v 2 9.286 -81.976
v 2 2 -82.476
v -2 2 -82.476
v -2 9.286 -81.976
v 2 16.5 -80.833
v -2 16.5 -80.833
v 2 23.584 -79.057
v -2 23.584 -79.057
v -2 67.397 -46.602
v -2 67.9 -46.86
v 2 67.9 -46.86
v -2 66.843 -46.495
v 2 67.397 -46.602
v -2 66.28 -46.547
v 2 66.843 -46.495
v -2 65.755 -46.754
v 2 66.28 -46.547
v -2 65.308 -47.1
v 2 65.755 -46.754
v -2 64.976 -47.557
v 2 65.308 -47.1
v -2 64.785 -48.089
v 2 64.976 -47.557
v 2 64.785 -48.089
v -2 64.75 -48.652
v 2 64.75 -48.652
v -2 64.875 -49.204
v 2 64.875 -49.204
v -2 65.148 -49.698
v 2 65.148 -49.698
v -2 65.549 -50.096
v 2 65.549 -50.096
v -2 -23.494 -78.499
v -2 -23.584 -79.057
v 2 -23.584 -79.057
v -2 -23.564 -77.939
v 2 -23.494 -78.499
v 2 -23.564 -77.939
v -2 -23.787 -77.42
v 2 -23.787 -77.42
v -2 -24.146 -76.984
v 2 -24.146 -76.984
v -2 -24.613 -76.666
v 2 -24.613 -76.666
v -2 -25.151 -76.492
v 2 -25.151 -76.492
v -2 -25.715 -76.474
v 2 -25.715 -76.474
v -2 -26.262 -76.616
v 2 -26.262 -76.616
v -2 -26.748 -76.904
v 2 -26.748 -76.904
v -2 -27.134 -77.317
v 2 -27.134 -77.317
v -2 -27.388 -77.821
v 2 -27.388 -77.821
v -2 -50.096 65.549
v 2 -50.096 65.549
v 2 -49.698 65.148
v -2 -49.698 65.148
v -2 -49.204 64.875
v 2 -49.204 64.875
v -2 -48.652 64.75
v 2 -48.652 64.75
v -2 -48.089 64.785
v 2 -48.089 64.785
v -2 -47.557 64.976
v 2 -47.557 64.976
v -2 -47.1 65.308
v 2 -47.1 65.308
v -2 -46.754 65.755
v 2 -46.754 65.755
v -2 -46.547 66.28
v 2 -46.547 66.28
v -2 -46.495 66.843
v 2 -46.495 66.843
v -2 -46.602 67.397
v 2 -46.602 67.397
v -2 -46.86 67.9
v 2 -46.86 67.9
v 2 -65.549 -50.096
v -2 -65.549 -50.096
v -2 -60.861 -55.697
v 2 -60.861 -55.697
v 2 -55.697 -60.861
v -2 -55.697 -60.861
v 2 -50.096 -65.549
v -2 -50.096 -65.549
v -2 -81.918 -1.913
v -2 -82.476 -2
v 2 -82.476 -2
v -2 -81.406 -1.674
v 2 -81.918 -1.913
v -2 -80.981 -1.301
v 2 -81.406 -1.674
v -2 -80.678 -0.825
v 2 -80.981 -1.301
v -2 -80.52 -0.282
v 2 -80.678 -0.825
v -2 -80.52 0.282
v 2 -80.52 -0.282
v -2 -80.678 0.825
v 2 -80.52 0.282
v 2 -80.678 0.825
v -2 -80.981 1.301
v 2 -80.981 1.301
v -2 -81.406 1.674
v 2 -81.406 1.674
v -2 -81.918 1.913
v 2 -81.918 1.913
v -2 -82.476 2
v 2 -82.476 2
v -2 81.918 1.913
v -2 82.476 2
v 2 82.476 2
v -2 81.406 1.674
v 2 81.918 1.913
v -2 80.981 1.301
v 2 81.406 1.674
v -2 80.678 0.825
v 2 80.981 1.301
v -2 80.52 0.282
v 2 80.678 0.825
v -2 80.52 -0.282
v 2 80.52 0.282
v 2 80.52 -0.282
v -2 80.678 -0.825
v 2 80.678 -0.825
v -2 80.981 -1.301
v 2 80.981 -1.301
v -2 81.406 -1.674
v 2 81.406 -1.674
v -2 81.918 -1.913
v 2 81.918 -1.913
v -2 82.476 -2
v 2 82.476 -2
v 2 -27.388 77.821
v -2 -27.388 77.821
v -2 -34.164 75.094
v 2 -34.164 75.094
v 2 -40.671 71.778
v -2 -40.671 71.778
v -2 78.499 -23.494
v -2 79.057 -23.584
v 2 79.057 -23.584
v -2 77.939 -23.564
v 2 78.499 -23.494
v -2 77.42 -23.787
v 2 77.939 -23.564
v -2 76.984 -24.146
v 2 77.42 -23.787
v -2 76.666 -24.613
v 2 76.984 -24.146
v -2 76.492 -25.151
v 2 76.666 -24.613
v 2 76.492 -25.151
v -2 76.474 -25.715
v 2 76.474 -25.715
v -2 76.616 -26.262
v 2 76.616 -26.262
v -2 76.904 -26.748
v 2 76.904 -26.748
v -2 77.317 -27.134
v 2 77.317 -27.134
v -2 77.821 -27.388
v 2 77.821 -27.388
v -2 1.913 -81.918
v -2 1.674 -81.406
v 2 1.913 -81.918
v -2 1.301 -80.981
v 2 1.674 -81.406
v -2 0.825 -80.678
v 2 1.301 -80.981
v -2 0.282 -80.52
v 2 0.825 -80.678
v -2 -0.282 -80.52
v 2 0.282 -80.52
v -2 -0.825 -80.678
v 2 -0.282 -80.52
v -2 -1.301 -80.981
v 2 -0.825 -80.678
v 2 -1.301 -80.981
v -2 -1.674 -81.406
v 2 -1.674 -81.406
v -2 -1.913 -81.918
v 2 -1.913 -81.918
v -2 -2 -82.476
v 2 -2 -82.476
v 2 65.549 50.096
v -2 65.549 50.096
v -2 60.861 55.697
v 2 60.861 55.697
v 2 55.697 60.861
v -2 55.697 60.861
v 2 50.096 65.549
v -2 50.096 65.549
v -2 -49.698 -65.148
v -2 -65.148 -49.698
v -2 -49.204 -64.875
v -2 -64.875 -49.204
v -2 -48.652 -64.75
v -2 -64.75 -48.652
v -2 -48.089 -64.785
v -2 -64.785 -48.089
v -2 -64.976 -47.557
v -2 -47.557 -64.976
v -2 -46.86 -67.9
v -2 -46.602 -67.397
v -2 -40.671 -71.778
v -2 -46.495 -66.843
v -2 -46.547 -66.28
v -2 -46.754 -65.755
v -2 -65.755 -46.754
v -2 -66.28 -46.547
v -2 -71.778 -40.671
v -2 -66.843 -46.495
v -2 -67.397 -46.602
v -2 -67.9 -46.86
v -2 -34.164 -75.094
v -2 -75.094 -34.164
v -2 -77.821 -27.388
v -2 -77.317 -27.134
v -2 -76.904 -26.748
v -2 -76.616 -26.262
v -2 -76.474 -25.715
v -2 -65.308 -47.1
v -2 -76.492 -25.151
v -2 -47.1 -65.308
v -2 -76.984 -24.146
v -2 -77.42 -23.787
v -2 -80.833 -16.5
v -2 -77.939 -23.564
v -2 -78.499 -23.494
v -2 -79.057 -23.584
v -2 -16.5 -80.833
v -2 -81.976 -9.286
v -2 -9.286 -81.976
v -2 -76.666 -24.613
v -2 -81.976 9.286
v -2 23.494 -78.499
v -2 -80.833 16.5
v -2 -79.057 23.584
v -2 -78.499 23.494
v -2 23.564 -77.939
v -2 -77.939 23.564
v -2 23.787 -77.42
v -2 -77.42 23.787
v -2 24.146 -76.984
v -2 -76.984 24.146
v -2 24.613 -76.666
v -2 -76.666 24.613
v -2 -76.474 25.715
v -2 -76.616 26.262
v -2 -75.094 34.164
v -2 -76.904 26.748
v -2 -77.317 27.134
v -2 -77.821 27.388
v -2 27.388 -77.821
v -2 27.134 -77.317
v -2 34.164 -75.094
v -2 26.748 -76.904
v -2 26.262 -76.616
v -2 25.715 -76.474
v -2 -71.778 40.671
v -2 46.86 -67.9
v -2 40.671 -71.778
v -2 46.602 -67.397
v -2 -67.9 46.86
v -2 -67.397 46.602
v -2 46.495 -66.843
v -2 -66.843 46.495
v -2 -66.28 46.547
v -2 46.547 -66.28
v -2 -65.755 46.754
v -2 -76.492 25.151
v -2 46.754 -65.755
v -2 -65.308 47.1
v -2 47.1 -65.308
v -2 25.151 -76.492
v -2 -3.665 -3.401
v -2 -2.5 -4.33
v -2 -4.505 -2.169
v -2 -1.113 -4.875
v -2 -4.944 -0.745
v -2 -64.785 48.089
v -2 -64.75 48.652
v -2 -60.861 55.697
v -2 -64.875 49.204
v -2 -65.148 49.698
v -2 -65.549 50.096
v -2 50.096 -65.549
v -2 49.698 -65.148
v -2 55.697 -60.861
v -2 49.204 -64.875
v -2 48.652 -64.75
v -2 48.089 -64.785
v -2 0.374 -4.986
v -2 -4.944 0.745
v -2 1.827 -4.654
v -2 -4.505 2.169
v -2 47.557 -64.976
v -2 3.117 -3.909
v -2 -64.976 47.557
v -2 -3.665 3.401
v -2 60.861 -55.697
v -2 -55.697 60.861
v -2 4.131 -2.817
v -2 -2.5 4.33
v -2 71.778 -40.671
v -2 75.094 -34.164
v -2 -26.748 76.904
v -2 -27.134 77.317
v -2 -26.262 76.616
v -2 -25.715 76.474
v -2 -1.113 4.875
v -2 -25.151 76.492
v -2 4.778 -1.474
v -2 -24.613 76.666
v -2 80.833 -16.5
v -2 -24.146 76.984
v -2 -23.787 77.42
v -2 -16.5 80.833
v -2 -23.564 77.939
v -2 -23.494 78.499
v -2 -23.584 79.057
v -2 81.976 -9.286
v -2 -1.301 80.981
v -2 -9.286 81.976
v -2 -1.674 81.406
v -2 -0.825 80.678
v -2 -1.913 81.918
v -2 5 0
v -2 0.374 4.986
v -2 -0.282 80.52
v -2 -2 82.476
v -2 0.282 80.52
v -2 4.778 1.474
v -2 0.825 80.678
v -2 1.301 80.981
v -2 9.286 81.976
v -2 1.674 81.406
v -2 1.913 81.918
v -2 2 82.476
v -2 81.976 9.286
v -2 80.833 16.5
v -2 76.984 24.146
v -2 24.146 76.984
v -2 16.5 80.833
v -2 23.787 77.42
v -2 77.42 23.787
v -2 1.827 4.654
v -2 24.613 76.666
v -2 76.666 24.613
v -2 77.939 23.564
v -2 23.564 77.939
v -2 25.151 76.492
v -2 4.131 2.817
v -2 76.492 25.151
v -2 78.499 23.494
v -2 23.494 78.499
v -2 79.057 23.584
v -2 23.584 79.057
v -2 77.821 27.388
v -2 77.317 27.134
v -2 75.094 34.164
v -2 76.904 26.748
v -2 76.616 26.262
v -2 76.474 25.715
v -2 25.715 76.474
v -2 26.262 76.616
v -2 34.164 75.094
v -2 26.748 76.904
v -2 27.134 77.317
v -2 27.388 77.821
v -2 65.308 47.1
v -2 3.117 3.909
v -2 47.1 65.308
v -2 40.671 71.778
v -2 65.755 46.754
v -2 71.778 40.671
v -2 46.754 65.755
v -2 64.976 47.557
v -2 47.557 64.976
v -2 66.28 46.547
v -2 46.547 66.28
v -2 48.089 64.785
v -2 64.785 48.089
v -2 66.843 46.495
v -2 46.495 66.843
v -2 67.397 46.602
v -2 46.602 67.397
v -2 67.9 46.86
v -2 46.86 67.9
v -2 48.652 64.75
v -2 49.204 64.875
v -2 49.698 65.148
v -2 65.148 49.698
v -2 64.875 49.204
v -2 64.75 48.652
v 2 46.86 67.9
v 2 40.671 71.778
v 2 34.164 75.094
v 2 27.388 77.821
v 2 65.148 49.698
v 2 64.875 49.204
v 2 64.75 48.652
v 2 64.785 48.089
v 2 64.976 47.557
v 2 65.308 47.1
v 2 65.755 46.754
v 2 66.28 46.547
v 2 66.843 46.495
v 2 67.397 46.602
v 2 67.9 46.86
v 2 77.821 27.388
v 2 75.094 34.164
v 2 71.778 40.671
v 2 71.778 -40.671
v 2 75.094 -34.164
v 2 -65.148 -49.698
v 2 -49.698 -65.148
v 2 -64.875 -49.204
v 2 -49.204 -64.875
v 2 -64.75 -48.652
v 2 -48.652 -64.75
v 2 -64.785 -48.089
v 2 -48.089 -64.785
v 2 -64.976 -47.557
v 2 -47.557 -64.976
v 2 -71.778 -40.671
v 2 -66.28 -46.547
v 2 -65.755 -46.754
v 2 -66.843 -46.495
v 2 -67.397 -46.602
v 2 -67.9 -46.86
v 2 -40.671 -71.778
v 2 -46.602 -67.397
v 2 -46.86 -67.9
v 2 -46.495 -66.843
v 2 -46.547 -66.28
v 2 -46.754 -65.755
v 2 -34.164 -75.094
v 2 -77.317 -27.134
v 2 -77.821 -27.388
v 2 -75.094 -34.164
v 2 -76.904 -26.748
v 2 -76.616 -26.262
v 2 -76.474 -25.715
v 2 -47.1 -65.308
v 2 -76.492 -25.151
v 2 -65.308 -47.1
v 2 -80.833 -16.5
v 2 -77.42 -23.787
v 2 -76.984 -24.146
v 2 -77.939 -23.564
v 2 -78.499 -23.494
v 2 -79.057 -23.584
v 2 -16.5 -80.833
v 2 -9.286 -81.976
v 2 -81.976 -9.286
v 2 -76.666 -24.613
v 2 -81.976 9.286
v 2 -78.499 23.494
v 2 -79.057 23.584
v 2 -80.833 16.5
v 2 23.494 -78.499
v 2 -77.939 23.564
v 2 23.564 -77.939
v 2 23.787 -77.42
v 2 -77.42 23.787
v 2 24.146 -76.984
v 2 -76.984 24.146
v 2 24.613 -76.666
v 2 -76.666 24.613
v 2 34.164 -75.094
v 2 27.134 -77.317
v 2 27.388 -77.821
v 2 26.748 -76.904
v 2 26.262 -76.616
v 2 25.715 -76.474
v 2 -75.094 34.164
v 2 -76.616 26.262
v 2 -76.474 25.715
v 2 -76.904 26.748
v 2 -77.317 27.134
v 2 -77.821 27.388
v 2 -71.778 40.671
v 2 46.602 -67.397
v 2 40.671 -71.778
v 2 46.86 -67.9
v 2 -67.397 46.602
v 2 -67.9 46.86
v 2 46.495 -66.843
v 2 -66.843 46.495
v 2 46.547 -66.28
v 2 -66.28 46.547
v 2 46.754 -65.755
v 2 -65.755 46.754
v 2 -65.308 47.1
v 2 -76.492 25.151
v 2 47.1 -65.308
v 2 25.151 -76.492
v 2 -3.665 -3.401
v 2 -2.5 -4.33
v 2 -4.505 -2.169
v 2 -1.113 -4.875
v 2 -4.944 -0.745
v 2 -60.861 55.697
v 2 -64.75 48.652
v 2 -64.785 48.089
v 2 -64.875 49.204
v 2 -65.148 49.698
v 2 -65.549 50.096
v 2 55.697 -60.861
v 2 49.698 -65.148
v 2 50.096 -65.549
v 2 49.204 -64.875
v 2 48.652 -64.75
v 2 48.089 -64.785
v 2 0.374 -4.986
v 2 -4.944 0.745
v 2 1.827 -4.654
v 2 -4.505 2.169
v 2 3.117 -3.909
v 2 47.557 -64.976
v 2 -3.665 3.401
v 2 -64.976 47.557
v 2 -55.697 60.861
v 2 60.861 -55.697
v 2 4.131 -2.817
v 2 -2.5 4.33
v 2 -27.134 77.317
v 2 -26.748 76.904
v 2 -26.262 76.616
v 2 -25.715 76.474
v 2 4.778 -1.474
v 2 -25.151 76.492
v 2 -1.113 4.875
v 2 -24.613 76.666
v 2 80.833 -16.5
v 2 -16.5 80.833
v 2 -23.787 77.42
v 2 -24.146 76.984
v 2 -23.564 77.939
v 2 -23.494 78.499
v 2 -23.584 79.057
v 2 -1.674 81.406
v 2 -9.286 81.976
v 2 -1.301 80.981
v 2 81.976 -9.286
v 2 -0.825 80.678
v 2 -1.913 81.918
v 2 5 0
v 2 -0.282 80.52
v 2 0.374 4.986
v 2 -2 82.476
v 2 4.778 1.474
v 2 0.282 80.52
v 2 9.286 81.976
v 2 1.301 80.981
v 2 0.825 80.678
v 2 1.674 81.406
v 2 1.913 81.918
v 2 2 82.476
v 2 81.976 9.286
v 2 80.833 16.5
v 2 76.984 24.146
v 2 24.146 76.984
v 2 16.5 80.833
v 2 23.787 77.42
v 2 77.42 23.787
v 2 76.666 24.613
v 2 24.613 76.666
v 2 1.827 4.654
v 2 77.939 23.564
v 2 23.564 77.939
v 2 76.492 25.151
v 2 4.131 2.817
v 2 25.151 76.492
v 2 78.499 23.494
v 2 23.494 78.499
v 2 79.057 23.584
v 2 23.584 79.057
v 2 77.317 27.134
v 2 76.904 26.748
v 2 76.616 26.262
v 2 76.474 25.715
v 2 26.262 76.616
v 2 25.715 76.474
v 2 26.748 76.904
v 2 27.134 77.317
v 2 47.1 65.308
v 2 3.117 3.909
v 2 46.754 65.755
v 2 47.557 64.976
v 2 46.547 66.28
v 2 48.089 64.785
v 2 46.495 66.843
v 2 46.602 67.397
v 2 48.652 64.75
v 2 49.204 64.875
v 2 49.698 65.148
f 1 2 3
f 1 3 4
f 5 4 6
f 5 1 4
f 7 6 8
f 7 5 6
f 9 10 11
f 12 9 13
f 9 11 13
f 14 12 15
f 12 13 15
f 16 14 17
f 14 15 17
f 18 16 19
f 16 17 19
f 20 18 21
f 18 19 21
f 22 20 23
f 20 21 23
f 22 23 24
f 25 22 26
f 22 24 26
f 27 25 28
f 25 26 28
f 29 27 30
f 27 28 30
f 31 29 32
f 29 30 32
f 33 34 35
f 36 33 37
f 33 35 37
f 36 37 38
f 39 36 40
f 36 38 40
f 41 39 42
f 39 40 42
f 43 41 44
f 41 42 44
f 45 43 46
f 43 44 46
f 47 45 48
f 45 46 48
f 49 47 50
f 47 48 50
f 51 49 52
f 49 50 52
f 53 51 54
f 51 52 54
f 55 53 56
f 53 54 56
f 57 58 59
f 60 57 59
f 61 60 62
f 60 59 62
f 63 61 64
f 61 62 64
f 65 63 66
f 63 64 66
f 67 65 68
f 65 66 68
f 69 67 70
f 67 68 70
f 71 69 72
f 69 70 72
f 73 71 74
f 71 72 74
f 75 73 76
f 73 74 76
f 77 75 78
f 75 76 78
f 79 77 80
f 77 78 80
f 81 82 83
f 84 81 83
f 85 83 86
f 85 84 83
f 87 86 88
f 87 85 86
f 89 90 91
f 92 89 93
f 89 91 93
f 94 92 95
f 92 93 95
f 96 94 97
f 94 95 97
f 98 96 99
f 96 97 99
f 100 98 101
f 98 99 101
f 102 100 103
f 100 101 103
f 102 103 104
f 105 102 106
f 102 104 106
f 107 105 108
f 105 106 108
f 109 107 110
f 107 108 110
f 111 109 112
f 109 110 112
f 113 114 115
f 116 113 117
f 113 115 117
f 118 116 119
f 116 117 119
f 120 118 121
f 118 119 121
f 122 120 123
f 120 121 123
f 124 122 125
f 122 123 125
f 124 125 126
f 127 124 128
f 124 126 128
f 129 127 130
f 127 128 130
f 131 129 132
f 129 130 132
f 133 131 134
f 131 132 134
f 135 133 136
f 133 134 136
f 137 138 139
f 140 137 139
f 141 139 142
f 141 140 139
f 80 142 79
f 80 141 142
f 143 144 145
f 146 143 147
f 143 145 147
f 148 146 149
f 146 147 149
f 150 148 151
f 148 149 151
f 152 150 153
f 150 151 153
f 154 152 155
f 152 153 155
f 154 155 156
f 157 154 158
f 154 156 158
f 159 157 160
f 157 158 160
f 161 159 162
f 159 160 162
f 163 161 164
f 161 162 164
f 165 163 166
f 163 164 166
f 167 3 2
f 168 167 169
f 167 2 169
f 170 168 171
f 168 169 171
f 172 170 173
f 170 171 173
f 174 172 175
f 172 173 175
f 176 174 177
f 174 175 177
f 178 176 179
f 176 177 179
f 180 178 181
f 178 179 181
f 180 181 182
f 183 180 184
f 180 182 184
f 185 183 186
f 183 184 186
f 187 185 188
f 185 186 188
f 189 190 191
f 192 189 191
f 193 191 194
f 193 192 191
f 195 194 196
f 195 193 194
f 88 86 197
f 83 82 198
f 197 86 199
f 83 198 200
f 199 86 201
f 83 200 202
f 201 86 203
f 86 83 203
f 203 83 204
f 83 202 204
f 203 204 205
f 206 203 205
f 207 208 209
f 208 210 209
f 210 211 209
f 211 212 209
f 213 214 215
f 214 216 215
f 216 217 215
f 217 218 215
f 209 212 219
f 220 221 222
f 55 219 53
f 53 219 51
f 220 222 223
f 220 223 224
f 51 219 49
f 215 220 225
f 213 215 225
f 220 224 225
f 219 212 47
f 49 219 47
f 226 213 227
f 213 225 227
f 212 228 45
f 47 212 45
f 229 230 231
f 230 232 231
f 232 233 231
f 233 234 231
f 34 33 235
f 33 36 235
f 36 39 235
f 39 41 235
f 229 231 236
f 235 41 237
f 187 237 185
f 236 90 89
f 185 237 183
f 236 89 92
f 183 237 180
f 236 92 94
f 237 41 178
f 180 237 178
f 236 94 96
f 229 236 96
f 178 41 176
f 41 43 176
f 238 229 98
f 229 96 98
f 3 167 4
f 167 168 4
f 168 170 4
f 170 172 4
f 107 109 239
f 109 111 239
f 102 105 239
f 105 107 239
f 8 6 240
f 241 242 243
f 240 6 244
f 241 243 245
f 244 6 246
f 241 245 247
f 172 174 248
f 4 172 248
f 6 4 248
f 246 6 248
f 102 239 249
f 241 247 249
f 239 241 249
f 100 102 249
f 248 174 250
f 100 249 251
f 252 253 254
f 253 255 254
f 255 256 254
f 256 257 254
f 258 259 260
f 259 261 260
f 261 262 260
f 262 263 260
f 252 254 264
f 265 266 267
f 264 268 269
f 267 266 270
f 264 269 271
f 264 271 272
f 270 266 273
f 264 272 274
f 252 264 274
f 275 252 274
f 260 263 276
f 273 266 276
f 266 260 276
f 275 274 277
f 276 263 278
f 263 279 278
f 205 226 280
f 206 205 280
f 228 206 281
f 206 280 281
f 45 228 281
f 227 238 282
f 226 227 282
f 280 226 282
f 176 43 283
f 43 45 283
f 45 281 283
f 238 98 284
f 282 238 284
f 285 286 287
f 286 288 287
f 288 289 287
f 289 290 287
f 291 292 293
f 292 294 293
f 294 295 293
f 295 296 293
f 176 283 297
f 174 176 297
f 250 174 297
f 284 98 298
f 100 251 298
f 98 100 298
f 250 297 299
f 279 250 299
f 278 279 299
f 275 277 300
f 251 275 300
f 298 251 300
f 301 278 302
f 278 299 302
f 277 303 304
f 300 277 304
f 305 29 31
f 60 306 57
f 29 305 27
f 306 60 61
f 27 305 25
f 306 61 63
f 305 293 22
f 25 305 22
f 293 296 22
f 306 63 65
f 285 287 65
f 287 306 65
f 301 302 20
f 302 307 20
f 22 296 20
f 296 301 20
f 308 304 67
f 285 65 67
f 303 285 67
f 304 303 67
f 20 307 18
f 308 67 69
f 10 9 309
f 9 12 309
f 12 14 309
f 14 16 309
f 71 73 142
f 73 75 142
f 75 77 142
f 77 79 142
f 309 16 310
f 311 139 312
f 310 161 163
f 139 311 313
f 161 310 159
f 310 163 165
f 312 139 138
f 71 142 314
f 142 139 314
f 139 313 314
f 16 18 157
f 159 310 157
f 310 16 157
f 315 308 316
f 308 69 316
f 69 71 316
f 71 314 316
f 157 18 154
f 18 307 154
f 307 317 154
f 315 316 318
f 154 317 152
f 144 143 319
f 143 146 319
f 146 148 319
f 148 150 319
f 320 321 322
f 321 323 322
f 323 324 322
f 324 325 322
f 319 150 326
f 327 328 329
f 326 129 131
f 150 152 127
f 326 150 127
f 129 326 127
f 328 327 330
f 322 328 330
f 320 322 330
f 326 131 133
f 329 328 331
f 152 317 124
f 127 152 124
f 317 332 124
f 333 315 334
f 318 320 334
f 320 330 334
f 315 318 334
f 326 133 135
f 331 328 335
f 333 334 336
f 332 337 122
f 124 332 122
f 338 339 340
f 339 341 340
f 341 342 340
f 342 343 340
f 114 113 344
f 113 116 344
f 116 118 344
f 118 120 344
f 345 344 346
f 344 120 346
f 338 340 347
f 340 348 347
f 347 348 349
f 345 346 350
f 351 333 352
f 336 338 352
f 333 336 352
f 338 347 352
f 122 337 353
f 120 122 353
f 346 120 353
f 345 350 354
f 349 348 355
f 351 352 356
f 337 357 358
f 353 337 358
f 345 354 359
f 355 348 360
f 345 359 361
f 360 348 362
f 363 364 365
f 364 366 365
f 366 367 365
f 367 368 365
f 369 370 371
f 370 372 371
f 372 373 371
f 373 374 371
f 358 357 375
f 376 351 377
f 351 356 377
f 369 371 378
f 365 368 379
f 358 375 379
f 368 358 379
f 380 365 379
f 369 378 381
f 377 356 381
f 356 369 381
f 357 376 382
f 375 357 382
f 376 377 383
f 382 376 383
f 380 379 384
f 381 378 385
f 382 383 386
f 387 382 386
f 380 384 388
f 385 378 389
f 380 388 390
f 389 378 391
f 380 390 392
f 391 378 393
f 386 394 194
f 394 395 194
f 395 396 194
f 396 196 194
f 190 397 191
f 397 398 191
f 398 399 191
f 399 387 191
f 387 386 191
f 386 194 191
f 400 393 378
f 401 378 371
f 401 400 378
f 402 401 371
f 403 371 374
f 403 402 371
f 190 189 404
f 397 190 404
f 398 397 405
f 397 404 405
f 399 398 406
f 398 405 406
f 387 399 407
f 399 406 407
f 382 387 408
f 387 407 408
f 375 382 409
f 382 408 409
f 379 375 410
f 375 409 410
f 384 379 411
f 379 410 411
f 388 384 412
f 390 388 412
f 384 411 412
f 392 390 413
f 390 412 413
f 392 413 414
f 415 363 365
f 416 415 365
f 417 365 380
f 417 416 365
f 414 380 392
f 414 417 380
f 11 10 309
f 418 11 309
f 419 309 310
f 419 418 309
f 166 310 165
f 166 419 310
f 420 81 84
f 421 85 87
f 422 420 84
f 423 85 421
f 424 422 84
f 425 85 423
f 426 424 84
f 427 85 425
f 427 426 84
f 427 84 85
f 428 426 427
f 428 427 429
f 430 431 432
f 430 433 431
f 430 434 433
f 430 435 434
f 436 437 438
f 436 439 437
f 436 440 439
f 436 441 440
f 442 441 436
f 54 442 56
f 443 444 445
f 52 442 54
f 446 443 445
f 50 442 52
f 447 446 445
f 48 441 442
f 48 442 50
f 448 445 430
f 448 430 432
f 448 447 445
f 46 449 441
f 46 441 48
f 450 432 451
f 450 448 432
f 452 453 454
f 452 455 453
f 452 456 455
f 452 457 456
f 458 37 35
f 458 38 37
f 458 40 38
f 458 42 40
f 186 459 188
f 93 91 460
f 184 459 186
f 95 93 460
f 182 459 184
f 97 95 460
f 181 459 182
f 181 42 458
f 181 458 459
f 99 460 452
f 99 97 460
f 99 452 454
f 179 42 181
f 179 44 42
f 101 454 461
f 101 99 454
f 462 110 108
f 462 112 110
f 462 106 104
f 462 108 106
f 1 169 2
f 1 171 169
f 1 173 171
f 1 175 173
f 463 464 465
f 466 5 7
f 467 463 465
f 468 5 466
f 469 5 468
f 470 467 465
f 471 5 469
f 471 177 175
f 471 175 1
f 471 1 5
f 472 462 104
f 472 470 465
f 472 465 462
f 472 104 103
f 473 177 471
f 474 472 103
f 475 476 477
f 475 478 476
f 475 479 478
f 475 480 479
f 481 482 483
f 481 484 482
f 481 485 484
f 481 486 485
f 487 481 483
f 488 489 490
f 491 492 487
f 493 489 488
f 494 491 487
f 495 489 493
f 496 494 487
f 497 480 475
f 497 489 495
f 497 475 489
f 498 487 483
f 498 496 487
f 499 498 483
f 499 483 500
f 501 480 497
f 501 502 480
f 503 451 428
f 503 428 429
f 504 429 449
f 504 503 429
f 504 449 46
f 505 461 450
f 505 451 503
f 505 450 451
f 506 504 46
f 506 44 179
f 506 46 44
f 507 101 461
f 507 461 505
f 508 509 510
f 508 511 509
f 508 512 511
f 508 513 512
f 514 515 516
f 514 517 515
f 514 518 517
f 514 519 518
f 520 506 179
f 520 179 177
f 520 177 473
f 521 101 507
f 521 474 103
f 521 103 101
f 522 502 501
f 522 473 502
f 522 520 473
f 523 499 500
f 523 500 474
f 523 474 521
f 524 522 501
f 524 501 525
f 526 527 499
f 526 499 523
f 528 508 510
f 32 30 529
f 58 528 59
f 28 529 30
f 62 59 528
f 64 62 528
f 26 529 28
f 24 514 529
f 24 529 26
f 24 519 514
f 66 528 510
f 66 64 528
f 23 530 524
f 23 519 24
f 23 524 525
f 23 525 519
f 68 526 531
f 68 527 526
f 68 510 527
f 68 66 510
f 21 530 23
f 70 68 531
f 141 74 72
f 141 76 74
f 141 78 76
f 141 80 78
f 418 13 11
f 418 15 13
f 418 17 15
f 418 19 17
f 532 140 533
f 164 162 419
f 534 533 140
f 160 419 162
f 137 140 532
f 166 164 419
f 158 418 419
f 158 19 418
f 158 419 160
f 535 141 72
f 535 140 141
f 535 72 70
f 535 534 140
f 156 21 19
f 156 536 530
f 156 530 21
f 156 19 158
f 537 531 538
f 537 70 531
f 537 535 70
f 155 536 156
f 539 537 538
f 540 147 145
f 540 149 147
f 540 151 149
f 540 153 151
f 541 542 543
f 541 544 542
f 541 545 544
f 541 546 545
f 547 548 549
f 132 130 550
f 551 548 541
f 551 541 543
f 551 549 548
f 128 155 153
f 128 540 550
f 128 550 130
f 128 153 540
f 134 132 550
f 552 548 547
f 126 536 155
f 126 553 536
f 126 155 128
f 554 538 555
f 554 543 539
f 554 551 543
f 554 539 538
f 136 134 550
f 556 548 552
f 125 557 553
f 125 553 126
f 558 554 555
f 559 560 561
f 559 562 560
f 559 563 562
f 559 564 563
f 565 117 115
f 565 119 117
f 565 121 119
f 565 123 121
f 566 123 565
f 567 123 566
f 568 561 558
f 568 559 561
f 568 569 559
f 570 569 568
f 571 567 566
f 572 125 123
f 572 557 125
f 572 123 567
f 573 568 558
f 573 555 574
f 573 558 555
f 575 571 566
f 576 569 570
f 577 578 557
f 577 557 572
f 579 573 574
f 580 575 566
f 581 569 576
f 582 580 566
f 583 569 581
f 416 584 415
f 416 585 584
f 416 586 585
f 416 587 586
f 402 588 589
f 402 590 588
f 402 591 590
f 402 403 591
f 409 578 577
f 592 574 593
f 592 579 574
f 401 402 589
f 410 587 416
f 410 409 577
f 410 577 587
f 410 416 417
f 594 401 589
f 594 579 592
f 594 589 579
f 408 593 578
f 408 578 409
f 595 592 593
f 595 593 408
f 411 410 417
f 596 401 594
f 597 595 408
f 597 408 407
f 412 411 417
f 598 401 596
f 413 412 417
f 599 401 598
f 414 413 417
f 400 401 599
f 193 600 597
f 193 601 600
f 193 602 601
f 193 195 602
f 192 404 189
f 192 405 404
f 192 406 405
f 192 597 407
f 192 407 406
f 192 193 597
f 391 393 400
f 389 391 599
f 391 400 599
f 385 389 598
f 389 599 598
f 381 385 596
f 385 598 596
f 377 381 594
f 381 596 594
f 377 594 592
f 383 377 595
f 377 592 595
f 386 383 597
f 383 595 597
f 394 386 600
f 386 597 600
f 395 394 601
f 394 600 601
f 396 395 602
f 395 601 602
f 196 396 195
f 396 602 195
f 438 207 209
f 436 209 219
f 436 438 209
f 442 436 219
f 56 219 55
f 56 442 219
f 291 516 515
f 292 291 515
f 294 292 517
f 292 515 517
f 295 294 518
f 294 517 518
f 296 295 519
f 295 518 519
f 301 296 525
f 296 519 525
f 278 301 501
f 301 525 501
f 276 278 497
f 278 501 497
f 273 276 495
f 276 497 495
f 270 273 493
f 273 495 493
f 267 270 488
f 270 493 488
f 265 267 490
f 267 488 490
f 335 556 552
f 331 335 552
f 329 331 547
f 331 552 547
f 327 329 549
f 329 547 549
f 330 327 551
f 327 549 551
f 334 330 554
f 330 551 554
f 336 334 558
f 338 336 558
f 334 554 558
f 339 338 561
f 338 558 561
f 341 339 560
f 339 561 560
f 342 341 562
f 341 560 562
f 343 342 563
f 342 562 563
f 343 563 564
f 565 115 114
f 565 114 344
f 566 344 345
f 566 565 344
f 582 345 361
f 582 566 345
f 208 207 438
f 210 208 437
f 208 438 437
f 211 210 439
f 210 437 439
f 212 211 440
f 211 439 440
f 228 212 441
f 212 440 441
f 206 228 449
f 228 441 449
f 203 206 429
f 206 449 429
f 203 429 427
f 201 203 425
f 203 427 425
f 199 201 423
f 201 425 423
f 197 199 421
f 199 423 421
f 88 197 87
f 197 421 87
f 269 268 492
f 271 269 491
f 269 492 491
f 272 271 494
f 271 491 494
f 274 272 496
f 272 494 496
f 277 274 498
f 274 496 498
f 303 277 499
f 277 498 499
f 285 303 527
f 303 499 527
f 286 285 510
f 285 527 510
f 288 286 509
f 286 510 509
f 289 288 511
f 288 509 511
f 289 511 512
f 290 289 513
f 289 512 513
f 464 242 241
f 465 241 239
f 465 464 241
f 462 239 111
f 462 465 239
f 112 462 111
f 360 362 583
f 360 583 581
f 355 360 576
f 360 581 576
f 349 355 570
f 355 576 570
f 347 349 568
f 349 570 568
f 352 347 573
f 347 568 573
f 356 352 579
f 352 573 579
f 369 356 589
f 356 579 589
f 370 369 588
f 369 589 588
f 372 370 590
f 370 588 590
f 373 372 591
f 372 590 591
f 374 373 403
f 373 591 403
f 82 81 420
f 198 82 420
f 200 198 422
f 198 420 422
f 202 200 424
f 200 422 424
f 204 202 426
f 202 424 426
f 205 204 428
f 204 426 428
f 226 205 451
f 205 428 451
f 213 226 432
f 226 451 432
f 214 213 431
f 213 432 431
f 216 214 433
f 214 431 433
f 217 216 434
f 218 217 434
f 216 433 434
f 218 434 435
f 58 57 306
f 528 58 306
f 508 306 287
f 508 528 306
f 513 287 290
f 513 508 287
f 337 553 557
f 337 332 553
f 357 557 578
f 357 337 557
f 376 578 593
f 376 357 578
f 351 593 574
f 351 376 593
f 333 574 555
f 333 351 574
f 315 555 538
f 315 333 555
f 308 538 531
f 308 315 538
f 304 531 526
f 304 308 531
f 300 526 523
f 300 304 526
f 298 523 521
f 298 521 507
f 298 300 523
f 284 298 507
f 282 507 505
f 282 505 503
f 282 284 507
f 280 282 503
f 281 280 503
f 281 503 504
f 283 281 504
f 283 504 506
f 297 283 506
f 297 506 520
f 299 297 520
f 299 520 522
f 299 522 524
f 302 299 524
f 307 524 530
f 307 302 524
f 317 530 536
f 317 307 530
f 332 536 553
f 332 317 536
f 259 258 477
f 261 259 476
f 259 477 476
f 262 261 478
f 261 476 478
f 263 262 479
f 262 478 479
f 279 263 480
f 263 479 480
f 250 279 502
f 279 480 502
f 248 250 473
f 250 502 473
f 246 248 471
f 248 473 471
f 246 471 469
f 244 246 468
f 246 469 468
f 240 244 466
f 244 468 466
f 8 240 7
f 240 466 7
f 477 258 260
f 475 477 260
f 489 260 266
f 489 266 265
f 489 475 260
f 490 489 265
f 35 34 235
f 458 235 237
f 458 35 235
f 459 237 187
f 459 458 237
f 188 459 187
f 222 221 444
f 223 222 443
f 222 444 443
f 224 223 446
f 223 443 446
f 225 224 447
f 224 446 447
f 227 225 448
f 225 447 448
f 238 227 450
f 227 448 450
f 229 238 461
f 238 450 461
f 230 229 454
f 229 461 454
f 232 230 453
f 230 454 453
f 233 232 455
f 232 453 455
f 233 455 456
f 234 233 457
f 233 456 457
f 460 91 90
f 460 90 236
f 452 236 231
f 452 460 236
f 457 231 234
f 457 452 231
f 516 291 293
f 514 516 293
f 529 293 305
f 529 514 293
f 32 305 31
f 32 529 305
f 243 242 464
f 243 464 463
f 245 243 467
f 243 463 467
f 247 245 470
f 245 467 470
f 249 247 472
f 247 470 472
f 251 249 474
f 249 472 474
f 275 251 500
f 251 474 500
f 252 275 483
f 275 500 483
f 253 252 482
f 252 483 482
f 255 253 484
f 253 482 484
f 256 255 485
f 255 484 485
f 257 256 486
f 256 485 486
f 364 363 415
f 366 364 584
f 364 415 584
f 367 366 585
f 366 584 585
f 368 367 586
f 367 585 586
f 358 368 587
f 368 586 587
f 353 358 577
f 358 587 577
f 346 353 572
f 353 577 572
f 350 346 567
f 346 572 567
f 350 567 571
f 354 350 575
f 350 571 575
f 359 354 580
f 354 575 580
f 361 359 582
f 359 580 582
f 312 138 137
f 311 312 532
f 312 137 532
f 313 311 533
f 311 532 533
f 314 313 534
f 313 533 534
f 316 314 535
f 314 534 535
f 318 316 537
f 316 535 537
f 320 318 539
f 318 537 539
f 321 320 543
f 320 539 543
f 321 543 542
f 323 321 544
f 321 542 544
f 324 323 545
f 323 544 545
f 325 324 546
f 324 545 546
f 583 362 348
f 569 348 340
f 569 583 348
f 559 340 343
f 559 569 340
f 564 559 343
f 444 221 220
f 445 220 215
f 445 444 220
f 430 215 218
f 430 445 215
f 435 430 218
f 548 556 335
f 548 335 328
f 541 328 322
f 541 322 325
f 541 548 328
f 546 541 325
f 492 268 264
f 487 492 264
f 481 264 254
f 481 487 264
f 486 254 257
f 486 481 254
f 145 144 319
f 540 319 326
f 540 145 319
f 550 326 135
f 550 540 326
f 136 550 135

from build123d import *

# Parameters (mm, degrees)
F0_R            = 82.5
F0_R_2          = 5
F1_DEPTH        = 2
F1_DEPTH_BACK   = 2
F2_R            = 2
F3_DEPTH        = 4.001
F3_COPIES_COUNT = 20


# Not quite as in the source:
# - a pattern or mirror of a feature is missing from the dataset's text; its kind, count and spacing are read off the source's solid


with BuildPart() as f1:
    # F0 (on Right) → F1 (new body, two sides)
    with BuildSketch(Plane.YZ) as f1_sk:
        Circle(F0_R)
        Circle(F0_R_2, mode=Mode.SUBTRACT)
    extrude(amount=F1_DEPTH)
    extrude(f1_sk.sketch, amount=-F1_DEPTH_BACK)

    # F2 (on face) → F3 (cut, through all)
    with BuildSketch(Plane.YZ.offset(2)):
        with Locations((0, 82.5)):
            Circle(F2_R)
    f3 = extrude(amount=-F3_DEPTH, mode=Mode.SUBTRACT)

    # F3_copies: F3 ×20 about axis
    f3_copies_axis = Axis((0, 0, 0), (1, 0, 0))
    for i in range(1, F3_COPIES_COUNT):
        add(f3.rotate(f3_copies_axis, i * 360 / F3_COPIES_COUNT), mode=Mode.SUBTRACT)


solid = f1.part
